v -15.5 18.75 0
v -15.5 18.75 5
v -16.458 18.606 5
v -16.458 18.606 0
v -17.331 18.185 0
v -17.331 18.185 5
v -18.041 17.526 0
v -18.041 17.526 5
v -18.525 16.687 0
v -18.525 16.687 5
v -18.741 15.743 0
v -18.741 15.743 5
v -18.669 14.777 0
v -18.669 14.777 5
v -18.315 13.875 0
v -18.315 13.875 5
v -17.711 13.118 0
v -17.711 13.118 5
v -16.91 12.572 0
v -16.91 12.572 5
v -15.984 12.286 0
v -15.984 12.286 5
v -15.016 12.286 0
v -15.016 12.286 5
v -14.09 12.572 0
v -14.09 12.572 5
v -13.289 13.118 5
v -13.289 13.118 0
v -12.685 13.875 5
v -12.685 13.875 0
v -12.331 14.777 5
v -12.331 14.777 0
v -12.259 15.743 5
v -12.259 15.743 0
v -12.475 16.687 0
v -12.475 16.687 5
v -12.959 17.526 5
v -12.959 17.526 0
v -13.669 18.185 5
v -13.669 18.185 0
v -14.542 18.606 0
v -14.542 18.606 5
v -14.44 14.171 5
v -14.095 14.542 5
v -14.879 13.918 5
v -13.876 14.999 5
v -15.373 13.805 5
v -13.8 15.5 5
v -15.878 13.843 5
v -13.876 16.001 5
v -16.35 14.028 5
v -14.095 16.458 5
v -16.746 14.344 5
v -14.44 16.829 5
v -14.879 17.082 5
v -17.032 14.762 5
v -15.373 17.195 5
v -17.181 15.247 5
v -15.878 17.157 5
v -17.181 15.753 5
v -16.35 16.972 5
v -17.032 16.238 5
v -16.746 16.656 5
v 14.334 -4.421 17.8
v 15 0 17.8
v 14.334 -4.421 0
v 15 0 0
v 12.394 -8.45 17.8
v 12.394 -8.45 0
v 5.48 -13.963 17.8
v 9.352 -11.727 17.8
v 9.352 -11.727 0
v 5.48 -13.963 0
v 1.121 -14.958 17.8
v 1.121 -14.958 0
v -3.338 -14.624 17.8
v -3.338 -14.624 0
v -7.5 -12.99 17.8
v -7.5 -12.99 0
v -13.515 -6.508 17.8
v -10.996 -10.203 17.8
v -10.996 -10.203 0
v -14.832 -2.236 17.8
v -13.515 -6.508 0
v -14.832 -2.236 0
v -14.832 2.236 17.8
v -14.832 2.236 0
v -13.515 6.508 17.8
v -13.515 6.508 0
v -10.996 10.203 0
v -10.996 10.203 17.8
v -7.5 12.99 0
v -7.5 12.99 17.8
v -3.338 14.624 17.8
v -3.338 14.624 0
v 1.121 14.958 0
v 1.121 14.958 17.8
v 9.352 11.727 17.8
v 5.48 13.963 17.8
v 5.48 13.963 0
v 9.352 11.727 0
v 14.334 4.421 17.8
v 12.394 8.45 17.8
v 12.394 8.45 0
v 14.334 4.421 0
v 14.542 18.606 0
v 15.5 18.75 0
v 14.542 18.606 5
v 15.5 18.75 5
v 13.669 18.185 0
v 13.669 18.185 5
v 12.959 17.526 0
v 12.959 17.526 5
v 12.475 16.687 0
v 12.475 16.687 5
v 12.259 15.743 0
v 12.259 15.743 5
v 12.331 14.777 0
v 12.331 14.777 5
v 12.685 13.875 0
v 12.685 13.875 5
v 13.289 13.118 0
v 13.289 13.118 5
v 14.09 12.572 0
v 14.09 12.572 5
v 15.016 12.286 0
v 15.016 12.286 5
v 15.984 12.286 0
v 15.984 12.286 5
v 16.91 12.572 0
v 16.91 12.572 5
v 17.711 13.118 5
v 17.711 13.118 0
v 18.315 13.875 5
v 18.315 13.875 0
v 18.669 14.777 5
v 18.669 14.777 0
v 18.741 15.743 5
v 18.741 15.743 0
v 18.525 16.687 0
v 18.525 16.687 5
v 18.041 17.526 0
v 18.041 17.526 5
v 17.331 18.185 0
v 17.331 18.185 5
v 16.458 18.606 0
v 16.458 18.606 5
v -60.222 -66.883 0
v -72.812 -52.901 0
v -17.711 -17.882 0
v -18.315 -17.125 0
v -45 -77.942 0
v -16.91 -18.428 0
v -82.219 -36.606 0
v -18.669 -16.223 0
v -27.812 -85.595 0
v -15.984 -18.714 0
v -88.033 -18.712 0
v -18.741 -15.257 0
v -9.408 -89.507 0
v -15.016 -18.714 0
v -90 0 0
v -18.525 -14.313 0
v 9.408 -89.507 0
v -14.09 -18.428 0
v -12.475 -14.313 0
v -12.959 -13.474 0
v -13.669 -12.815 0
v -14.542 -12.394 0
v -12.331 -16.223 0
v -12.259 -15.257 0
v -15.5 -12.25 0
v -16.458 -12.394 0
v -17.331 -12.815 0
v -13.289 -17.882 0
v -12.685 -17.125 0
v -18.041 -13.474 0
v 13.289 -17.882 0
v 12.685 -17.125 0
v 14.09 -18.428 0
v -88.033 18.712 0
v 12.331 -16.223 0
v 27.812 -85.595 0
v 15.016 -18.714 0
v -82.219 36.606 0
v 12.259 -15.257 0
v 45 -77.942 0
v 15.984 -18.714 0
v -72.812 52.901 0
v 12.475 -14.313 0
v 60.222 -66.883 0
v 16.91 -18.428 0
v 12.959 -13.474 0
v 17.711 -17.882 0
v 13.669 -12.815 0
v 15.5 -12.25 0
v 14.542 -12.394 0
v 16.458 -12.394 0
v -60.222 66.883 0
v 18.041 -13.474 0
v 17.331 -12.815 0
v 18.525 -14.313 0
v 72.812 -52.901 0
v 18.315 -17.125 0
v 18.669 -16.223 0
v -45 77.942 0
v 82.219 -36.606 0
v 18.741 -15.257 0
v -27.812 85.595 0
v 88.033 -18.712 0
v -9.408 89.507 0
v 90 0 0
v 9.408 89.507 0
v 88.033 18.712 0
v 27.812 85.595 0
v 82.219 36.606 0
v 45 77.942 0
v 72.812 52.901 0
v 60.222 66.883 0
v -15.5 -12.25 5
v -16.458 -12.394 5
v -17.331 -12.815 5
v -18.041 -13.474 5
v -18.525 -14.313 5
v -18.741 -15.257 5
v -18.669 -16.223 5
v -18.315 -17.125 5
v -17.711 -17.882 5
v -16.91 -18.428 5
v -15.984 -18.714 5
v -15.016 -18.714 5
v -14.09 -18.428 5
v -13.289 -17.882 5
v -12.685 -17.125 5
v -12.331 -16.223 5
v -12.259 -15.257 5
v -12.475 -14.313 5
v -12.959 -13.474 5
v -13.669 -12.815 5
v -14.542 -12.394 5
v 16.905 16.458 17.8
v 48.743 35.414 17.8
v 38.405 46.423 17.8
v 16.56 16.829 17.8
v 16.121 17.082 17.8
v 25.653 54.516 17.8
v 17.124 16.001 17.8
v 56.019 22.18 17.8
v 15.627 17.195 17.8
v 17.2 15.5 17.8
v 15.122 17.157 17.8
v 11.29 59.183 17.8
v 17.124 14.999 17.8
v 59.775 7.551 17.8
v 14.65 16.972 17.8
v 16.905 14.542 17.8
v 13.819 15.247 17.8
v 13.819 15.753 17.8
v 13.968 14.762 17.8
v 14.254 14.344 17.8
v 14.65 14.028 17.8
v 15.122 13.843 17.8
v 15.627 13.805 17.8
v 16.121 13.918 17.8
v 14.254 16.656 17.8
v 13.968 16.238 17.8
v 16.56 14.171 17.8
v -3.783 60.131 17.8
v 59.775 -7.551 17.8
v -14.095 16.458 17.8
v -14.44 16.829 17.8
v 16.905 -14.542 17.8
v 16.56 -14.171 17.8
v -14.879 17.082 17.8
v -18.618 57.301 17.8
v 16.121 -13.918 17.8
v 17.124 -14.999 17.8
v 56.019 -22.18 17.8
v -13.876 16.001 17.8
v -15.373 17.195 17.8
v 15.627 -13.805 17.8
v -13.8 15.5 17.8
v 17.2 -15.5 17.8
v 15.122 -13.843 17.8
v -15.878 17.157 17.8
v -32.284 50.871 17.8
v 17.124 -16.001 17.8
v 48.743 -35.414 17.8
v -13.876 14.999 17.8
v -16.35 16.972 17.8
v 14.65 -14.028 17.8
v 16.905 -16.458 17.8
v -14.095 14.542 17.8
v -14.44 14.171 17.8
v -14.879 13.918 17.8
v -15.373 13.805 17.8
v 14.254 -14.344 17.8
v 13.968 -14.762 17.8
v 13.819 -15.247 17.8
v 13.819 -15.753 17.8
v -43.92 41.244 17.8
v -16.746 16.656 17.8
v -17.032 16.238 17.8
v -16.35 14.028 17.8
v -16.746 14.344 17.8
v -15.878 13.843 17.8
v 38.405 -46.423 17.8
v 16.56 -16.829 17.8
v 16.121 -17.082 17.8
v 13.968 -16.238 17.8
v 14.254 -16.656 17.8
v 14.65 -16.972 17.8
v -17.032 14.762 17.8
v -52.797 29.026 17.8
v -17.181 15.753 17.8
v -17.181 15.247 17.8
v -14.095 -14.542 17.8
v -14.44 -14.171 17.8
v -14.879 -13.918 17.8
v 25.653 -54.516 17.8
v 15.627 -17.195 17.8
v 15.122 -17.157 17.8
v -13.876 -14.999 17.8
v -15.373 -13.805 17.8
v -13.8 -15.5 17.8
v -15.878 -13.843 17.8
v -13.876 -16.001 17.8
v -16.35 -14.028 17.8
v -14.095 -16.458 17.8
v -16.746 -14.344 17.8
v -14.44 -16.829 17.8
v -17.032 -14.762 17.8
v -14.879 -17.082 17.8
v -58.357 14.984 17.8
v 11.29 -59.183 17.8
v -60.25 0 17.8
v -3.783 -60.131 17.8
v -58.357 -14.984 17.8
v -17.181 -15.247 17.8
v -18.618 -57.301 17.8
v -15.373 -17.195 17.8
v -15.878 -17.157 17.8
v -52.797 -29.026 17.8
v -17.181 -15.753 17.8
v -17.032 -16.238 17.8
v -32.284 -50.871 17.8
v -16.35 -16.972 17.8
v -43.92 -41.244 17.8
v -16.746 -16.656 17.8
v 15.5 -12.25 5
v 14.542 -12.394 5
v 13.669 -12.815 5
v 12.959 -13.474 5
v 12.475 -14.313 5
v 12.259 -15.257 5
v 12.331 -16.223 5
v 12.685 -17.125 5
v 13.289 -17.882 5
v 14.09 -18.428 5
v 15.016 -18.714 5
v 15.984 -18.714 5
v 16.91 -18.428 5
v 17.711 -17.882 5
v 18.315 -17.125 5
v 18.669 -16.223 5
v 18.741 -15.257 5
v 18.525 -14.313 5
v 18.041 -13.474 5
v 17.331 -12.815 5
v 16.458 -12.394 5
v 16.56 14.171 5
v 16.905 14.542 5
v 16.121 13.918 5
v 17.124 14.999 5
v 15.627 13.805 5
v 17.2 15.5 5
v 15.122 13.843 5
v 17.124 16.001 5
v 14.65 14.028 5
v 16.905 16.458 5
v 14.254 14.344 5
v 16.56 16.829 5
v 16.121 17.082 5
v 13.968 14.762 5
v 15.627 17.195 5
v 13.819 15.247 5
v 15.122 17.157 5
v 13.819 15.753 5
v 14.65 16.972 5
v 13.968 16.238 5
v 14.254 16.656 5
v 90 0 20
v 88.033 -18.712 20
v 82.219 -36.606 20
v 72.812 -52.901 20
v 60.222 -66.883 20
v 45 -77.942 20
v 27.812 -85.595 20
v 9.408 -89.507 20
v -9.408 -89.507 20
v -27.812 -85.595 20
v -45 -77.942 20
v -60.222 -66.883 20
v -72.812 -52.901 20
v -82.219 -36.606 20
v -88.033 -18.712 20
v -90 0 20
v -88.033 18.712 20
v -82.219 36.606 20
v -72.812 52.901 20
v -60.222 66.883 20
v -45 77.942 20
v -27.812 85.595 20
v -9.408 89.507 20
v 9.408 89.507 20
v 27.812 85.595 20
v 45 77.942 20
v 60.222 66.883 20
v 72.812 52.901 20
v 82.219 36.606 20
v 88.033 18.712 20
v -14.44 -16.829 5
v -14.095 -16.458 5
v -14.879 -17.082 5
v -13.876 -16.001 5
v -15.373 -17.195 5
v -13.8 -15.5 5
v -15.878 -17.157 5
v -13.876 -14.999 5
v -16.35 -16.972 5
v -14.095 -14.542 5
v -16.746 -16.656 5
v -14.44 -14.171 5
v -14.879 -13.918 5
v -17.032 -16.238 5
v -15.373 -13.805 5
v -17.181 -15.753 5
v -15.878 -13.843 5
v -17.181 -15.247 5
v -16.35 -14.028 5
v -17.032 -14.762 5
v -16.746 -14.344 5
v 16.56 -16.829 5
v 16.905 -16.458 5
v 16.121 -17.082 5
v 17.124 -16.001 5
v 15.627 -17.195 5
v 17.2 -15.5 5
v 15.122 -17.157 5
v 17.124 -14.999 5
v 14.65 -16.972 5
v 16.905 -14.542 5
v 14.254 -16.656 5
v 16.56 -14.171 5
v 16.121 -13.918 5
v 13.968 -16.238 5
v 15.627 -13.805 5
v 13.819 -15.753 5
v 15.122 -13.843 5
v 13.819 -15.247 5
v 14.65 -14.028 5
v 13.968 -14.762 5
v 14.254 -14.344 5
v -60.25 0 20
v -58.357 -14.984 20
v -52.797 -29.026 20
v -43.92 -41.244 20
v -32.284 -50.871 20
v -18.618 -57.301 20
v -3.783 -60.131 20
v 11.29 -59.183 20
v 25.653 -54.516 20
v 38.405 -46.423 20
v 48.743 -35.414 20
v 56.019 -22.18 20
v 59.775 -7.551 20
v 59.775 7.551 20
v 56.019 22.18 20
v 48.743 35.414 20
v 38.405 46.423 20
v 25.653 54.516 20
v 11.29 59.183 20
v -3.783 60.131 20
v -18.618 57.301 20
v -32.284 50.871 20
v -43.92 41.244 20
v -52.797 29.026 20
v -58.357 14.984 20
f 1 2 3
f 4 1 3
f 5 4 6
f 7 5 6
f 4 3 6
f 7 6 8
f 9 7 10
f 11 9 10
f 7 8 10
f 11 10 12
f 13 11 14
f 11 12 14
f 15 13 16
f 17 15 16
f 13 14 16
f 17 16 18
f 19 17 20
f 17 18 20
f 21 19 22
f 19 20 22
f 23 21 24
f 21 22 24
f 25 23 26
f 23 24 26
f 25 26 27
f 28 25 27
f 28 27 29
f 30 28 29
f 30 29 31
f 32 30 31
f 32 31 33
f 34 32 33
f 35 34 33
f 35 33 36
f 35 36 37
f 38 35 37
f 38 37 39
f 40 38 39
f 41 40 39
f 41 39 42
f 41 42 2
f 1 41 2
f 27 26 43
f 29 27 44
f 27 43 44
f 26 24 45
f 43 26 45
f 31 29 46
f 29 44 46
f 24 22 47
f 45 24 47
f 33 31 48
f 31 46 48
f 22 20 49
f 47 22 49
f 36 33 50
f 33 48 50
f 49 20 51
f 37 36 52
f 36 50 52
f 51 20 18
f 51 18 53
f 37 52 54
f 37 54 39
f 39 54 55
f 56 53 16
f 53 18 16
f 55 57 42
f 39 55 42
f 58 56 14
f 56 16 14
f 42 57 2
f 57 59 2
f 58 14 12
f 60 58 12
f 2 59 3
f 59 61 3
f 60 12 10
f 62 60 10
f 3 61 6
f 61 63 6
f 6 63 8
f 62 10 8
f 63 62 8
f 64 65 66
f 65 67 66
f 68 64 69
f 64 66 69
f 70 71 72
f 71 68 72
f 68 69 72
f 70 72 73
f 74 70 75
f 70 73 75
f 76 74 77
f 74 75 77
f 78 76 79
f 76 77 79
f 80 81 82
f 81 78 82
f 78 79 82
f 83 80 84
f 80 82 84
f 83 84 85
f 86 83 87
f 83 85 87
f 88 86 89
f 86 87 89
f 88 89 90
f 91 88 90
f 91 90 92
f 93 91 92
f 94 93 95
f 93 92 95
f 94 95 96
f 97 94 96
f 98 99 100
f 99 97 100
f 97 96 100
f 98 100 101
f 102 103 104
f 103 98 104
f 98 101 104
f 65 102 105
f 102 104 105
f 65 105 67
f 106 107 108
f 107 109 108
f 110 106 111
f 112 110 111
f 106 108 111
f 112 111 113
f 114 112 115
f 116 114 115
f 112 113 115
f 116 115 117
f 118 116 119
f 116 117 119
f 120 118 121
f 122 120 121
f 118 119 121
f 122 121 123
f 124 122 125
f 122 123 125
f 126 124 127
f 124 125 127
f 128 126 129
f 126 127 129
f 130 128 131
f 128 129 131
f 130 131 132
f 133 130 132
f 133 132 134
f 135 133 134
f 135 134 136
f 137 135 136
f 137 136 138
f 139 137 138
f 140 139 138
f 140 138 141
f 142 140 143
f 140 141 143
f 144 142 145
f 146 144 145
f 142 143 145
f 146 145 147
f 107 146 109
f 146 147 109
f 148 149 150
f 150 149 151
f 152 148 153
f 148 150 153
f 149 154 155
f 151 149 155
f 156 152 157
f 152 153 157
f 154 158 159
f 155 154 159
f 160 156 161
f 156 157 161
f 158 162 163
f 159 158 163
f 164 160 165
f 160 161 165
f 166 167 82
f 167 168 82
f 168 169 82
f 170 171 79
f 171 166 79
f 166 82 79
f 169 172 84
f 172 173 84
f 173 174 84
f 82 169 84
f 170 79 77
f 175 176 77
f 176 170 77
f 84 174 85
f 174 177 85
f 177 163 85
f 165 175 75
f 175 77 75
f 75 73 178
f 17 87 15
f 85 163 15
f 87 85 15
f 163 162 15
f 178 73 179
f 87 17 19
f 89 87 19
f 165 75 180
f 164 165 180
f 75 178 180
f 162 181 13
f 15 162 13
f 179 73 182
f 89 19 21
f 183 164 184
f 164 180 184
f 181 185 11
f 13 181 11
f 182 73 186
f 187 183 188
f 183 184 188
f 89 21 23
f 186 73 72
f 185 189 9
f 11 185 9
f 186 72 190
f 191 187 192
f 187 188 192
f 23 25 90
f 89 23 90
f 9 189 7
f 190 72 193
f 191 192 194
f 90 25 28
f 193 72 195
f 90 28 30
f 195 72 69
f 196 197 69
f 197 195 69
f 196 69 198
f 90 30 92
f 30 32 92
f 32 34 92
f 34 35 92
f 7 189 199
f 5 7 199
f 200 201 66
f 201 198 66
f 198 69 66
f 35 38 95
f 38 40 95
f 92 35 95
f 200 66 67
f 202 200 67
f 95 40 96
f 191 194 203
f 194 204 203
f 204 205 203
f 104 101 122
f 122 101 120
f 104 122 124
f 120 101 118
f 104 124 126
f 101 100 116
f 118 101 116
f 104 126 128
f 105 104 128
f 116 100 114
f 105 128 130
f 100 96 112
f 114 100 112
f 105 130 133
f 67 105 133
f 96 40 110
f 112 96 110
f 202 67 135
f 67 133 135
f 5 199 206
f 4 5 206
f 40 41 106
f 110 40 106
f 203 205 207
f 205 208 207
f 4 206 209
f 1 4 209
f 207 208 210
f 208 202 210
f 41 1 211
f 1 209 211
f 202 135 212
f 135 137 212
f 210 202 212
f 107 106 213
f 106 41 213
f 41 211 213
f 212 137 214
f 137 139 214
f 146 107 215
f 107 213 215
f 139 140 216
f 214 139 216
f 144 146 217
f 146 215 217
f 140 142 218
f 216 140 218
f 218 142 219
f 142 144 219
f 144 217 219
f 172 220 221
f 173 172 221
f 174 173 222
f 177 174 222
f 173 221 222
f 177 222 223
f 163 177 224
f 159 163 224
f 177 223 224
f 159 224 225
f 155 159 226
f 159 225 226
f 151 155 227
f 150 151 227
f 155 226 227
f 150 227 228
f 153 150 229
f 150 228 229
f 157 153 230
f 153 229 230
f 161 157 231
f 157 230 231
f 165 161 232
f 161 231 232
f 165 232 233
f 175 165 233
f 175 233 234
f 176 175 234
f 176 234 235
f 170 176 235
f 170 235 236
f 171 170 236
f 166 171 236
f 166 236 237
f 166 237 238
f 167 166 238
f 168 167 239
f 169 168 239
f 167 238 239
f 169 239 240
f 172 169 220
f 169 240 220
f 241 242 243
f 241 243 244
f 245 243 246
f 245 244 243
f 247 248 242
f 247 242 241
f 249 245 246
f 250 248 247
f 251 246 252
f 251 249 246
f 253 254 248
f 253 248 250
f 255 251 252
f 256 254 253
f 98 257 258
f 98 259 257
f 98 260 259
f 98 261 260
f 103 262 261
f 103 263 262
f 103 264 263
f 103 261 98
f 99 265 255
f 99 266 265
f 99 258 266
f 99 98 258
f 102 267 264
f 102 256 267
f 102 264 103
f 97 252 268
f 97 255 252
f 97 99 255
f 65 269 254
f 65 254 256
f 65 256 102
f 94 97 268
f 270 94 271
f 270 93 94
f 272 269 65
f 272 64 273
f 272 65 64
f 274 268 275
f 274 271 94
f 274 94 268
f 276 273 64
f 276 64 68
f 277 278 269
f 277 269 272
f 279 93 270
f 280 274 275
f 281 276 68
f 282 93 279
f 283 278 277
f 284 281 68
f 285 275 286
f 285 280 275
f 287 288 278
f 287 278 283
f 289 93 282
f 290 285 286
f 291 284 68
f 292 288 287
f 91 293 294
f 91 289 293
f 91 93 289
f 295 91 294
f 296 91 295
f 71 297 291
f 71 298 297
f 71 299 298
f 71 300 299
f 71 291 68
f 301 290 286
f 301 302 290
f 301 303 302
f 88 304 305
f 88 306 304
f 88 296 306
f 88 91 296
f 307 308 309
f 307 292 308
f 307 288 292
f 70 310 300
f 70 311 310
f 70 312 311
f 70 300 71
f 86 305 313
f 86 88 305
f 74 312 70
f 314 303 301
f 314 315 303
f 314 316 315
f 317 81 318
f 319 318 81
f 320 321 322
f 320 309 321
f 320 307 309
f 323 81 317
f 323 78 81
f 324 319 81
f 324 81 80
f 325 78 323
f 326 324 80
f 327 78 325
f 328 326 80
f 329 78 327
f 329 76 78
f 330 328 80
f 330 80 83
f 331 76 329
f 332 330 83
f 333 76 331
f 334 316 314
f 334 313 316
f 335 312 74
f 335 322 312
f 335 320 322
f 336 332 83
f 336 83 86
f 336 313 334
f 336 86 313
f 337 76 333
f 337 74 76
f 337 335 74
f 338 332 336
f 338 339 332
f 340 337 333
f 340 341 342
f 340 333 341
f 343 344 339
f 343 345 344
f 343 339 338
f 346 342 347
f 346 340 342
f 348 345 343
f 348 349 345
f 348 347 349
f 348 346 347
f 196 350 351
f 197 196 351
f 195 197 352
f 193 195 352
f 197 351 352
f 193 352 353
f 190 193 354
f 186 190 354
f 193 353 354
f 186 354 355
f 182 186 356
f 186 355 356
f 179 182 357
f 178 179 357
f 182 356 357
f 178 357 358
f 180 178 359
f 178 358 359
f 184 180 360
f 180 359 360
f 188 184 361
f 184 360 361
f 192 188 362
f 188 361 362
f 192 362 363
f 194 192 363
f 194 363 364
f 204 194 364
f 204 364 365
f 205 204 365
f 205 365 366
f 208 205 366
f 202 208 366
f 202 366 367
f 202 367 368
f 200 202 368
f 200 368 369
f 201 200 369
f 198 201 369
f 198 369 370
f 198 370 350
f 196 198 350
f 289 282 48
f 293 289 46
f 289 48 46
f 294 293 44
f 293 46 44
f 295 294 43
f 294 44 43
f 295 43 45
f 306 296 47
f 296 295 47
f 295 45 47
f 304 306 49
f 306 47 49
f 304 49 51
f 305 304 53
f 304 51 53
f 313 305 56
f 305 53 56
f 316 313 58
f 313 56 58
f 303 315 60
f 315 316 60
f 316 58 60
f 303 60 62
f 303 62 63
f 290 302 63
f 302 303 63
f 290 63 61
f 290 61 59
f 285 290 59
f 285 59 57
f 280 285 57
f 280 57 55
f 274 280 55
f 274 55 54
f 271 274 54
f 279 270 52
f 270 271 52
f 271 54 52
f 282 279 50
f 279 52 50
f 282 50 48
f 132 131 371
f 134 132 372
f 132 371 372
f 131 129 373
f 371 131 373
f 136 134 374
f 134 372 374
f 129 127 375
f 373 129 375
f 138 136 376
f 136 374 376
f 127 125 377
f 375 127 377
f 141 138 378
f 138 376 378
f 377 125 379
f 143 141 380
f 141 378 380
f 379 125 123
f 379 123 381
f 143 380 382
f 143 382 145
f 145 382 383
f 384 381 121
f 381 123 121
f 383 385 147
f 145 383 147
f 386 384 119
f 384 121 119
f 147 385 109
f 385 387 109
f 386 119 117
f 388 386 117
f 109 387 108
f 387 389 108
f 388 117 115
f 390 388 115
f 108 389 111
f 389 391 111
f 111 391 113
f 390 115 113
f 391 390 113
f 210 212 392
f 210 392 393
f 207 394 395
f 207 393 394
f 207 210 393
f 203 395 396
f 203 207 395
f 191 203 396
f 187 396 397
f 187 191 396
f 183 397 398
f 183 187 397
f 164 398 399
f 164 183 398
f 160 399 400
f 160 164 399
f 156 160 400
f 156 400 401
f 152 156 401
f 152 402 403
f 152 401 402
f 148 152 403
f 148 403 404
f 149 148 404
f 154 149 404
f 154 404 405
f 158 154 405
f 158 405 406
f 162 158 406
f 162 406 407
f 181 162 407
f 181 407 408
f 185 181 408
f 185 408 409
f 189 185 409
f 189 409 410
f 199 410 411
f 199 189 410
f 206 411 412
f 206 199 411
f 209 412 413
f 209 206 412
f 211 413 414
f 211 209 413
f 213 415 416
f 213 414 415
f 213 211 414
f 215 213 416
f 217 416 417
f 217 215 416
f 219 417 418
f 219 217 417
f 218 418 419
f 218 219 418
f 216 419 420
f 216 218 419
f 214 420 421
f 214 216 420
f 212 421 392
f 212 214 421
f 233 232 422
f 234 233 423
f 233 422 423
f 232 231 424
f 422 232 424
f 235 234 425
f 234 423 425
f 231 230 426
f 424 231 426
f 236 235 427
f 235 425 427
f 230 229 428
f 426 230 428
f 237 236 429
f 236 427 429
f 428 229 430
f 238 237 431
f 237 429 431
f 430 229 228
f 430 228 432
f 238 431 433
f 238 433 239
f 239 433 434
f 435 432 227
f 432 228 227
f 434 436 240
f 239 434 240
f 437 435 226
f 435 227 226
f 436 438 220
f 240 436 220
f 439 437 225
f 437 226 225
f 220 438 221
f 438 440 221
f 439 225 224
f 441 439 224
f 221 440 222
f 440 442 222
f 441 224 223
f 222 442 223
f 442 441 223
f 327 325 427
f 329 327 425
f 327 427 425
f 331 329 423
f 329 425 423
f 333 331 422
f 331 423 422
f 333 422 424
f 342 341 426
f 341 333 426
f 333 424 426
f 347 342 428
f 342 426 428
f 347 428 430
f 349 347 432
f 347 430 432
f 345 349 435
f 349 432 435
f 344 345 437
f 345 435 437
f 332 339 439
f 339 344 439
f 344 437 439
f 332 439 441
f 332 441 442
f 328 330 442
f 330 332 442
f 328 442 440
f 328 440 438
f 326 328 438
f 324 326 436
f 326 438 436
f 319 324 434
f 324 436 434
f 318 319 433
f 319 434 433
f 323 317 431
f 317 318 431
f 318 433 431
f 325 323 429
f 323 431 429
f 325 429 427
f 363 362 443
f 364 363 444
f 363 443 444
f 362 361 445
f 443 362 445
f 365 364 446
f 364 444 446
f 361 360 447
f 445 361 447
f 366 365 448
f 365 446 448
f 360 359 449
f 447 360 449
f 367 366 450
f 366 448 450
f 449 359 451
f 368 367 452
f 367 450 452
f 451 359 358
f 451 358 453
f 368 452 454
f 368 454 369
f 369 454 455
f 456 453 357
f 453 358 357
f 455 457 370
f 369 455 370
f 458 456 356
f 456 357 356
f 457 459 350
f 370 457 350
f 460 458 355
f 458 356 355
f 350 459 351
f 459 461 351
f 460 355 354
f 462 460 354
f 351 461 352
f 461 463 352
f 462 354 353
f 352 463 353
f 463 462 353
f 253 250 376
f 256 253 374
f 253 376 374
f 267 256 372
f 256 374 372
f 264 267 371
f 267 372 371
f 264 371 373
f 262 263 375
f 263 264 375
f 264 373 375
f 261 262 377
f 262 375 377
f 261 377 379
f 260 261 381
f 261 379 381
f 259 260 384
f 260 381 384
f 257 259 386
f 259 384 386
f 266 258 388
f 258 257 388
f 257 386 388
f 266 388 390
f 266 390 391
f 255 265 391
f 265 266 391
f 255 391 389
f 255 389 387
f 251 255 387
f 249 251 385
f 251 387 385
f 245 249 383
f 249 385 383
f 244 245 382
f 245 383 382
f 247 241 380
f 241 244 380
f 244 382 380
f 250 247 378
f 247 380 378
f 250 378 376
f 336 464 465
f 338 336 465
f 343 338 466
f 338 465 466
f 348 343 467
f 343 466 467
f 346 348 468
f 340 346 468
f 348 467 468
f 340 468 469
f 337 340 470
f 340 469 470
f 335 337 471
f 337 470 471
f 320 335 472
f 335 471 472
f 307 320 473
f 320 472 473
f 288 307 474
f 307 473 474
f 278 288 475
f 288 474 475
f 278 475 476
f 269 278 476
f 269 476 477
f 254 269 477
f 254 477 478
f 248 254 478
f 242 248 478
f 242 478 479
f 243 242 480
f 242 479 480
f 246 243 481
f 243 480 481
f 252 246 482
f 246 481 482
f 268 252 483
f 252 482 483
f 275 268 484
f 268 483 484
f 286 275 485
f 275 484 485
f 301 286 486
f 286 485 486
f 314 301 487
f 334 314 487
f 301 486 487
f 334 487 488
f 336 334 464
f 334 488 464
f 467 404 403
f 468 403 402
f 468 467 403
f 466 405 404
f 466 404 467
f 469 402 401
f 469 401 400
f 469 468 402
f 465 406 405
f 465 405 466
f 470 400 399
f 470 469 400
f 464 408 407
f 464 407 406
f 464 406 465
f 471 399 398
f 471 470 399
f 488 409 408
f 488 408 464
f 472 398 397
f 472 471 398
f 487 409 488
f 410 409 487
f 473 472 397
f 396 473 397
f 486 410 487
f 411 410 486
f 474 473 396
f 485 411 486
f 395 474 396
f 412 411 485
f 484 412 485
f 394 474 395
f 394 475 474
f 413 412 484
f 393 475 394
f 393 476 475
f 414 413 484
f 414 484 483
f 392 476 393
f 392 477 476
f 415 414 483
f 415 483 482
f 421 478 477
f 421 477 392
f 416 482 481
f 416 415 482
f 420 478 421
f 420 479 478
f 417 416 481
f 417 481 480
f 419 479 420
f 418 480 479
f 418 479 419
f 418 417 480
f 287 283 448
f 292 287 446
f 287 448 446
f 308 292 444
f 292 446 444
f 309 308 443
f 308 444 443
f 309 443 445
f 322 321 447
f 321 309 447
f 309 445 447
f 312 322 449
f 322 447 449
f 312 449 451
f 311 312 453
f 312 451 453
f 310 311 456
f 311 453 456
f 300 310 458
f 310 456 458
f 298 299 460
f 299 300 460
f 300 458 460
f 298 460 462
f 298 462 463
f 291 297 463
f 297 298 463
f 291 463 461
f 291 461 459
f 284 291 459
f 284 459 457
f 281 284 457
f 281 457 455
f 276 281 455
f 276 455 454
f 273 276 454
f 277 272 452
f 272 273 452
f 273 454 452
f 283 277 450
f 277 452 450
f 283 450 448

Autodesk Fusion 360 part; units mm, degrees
sketch "Sketch1" plane through (0, 0, 0) normal (0, 0, 1) x (1, 0, 0)
  circle A0 centre (0, 0) radius 90
  circle A1 centre (0, 0) radius 15
  line L0 (15.5, 15.5) -> (-15.5, 15.5)
  line L1 (-15.5, 15.5) -> (-15.5, -15.5)
  line L2 (-15.5, -15.5) -> (15.5, -15.5)
  line L3 (15.5, -15.5) -> (15.5, 15.5)
  line L4 (15.5, 15.5) -> (-15.5, -15.5) construction
  line L5 (-15.5, 15.5) -> (15.5, -15.5) construction
  circle A2 centre (-15.5, 15.5) radius 1.7
  circle A3 centre (15.5, 15.5) radius 1.7
  circle A4 centre (-15.5, -15.5) radius 1.7
  circle A5 centre (15.5, -15.5) radius 1.7
  dimension "d1" = 180
  dimension "d2" = 30
  dimension "d3" = 31
  dimension "d4" = 31
  dimension "d5" = 3.4
  dimension "d8" = 31
  dimension "d9" = -31
extrude "Extrude1" add sketch "Sketch1" along normal blind 20 contours A0 | L0 L1 L2 L3 A2 A3 A4 A5
sketch "Sketch2" plane through (0, 0, 20) normal (0, 0, 1) x (-1, 0, 0)
  circle A0 centre (0, 0) radius 15
  circle A1 centre (15.5, -15.5) radius 1.7
  circle A2 centre (15.5, 15.5) radius 1.7
  circle A3 centre (-15.5, -15.5) radius 1.7
  circle A4 centre (-15.5, 15.5) radius 1.7
  circle A5 centre (0, 0) radius 90
  circle A6 centre (0, 0) radius 60.25
  dimension "d12" = 120.5
extrude "Extrude2" cut sketch "Sketch2" against normal blind 2.2 contours A6
hole "Hole1" at (15.5, -15.5, 0) direction (0, 0, 1) diameter 3.2 depth 17.8 tip angle 118 counterbore diameter 6.5 counterbore depth 5
hole "Hole2" at (15.5, 15.5, 0) direction (0, 0, 1) diameter 3.2 depth 17.8 tip angle 118 counterbore diameter 6.5 counterbore depth 5
hole "Hole3" at (-15.5, -15.5, 0) direction (0, 0, 1) diameter 3.2 depth 17.8 tip angle 118 counterbore diameter 6.5 counterbore depth 5
hole "Hole4" at (-15.5, 15.5, 0) direction (0, 0, 1) diameter 3.2 depth 17.8 tip angle 118 counterbore diameter 6.5 counterbore depth 5
